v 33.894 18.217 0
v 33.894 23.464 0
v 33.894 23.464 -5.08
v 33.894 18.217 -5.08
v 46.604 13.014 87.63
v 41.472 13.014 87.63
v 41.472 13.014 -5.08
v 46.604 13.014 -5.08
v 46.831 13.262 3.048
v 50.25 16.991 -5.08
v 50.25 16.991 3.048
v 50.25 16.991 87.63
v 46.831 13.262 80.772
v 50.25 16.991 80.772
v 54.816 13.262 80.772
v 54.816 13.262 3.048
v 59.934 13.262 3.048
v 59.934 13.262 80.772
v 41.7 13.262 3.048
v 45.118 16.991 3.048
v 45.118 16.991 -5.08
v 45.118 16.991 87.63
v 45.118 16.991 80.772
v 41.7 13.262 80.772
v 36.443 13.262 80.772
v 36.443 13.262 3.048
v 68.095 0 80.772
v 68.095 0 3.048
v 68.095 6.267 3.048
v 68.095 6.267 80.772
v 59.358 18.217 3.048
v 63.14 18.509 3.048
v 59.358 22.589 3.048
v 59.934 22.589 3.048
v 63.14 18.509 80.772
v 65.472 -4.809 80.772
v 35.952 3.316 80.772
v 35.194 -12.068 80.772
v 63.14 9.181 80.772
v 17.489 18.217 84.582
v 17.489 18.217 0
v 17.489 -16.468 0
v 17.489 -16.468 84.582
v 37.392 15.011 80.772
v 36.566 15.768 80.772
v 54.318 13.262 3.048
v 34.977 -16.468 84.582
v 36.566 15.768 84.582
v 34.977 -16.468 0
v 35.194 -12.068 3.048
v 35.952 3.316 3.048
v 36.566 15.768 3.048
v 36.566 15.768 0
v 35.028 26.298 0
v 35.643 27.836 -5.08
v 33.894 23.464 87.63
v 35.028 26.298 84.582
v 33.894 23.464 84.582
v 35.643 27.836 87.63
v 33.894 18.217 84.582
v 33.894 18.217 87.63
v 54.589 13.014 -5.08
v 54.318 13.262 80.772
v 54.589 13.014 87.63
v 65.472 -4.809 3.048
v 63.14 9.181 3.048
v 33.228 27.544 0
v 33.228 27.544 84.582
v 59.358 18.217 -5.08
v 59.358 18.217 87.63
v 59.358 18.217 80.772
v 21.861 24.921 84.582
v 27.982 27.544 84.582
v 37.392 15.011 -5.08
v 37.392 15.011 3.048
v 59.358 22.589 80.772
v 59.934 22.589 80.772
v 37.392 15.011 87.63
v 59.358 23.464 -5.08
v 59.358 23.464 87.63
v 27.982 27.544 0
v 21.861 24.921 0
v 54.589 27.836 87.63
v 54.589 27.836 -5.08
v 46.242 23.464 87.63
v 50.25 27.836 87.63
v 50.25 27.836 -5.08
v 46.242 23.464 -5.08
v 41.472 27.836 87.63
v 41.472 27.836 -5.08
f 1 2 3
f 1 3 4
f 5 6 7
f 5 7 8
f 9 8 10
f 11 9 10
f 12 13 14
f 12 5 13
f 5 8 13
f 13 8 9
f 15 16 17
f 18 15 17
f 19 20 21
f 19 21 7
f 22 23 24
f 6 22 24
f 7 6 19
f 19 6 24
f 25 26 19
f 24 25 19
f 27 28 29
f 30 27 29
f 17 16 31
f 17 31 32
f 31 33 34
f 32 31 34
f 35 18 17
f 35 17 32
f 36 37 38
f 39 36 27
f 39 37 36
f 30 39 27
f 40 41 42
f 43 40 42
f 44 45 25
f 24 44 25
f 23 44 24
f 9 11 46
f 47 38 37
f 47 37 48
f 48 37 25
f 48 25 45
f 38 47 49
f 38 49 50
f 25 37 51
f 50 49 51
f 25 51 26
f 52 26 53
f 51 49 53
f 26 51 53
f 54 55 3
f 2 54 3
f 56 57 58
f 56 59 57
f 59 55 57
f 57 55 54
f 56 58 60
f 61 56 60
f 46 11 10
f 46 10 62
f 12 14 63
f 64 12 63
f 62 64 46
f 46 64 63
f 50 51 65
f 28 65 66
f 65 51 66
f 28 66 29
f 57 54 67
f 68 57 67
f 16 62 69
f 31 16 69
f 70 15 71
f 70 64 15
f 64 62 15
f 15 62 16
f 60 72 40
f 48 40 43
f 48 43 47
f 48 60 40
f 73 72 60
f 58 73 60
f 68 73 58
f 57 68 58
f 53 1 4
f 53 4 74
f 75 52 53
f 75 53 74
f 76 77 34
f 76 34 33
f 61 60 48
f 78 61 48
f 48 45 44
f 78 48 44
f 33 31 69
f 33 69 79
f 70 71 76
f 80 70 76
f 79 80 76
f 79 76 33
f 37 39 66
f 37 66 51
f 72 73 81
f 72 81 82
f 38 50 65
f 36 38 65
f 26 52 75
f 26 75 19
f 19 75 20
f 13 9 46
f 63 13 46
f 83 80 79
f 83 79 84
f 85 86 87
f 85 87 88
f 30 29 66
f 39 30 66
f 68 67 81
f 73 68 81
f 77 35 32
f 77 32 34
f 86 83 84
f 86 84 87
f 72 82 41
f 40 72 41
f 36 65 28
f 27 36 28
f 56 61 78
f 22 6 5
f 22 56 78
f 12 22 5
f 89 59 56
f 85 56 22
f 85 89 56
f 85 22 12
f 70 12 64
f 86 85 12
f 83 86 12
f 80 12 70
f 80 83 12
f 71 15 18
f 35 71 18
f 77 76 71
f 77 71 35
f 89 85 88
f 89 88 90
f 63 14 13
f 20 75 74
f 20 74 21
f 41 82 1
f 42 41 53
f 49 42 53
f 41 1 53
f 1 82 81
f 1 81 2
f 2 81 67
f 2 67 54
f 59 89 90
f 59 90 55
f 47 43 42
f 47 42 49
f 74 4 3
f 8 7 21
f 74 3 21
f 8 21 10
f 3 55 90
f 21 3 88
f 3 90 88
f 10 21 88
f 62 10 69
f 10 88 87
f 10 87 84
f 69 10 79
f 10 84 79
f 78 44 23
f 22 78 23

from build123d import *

# Parameters (mm, degrees)
F1_DEPTH      = 84.582
F3_START      = 3.048
F3_DEPTH      = 77.724
F5_DEPTH      = 87.63
F5_DEPTH_BACK = 5.08


with BuildPart() as f1:
    # F0 (on Top) → F1 (new body)
    with BuildSketch(Plane.XY):
        Polygon((17.4885243177, -16.4683610201), (34.9770486355, -16.4683610201), (37.0173789561, 24.9211471528), (33.228199929, 27.5444276631), (27.9816426337, 27.5444276631), (21.8606535345, 24.9211471528), (17.4885243177, 18.2172134519), align=None)
    extrude(amount=F1_DEPTH)

    # F2 (on Top) → F3 (join)
    with BuildSketch(Plane.XY.offset(F3_START)):
        Polygon((63.1398186088, 9.1814752668), (20.5844063312, 0), (22.9162164032, -15.0109836832), (65.4716193676, -4.809344653), (68.0949017406, 0), (68.0949017406, 6.2667215243), align=None)
        Polygon((59.933591634, 22.5893463939), (37.1985062957, 22.5893463939), (22.9162164032, 22.5893463939), (22.9162164032, 13.2621303201), (59.933591634, 13.2621303201), (63.1398186088, 18.508689478), align=None)
    extrude(amount=F3_DEPTH)

    # F4 (on Top) → F5 (join, two sides)
    with BuildSketch(Plane.XY) as f5_sk:
        Polygon((33.8941030204, 18.2172134519), (37.3918153346, 15.0109836832), (45.1184251433, 16.9914124986), (41.4724685252, 13.0139971915), (46.6038940806, 13.0139971915), (50.2498506988, 16.9914124986), (54.5888580382, 13.0139971915), (59.3584632455, 18.2172134519), (59.3584632455, 23.4637726098), (54.5888580382, 27.8359018266), (50.2498506988, 27.8359018266), (46.2420737325, 23.4637726098), (41.4724685252, 27.8359018266), (35.6429591775, 27.8359018266), (33.8941030204, 23.4637726098), align=None)
    extrude(amount=F5_DEPTH)
    extrude(f5_sk.sketch, amount=-F5_DEPTH_BACK)


solid = f1.part
